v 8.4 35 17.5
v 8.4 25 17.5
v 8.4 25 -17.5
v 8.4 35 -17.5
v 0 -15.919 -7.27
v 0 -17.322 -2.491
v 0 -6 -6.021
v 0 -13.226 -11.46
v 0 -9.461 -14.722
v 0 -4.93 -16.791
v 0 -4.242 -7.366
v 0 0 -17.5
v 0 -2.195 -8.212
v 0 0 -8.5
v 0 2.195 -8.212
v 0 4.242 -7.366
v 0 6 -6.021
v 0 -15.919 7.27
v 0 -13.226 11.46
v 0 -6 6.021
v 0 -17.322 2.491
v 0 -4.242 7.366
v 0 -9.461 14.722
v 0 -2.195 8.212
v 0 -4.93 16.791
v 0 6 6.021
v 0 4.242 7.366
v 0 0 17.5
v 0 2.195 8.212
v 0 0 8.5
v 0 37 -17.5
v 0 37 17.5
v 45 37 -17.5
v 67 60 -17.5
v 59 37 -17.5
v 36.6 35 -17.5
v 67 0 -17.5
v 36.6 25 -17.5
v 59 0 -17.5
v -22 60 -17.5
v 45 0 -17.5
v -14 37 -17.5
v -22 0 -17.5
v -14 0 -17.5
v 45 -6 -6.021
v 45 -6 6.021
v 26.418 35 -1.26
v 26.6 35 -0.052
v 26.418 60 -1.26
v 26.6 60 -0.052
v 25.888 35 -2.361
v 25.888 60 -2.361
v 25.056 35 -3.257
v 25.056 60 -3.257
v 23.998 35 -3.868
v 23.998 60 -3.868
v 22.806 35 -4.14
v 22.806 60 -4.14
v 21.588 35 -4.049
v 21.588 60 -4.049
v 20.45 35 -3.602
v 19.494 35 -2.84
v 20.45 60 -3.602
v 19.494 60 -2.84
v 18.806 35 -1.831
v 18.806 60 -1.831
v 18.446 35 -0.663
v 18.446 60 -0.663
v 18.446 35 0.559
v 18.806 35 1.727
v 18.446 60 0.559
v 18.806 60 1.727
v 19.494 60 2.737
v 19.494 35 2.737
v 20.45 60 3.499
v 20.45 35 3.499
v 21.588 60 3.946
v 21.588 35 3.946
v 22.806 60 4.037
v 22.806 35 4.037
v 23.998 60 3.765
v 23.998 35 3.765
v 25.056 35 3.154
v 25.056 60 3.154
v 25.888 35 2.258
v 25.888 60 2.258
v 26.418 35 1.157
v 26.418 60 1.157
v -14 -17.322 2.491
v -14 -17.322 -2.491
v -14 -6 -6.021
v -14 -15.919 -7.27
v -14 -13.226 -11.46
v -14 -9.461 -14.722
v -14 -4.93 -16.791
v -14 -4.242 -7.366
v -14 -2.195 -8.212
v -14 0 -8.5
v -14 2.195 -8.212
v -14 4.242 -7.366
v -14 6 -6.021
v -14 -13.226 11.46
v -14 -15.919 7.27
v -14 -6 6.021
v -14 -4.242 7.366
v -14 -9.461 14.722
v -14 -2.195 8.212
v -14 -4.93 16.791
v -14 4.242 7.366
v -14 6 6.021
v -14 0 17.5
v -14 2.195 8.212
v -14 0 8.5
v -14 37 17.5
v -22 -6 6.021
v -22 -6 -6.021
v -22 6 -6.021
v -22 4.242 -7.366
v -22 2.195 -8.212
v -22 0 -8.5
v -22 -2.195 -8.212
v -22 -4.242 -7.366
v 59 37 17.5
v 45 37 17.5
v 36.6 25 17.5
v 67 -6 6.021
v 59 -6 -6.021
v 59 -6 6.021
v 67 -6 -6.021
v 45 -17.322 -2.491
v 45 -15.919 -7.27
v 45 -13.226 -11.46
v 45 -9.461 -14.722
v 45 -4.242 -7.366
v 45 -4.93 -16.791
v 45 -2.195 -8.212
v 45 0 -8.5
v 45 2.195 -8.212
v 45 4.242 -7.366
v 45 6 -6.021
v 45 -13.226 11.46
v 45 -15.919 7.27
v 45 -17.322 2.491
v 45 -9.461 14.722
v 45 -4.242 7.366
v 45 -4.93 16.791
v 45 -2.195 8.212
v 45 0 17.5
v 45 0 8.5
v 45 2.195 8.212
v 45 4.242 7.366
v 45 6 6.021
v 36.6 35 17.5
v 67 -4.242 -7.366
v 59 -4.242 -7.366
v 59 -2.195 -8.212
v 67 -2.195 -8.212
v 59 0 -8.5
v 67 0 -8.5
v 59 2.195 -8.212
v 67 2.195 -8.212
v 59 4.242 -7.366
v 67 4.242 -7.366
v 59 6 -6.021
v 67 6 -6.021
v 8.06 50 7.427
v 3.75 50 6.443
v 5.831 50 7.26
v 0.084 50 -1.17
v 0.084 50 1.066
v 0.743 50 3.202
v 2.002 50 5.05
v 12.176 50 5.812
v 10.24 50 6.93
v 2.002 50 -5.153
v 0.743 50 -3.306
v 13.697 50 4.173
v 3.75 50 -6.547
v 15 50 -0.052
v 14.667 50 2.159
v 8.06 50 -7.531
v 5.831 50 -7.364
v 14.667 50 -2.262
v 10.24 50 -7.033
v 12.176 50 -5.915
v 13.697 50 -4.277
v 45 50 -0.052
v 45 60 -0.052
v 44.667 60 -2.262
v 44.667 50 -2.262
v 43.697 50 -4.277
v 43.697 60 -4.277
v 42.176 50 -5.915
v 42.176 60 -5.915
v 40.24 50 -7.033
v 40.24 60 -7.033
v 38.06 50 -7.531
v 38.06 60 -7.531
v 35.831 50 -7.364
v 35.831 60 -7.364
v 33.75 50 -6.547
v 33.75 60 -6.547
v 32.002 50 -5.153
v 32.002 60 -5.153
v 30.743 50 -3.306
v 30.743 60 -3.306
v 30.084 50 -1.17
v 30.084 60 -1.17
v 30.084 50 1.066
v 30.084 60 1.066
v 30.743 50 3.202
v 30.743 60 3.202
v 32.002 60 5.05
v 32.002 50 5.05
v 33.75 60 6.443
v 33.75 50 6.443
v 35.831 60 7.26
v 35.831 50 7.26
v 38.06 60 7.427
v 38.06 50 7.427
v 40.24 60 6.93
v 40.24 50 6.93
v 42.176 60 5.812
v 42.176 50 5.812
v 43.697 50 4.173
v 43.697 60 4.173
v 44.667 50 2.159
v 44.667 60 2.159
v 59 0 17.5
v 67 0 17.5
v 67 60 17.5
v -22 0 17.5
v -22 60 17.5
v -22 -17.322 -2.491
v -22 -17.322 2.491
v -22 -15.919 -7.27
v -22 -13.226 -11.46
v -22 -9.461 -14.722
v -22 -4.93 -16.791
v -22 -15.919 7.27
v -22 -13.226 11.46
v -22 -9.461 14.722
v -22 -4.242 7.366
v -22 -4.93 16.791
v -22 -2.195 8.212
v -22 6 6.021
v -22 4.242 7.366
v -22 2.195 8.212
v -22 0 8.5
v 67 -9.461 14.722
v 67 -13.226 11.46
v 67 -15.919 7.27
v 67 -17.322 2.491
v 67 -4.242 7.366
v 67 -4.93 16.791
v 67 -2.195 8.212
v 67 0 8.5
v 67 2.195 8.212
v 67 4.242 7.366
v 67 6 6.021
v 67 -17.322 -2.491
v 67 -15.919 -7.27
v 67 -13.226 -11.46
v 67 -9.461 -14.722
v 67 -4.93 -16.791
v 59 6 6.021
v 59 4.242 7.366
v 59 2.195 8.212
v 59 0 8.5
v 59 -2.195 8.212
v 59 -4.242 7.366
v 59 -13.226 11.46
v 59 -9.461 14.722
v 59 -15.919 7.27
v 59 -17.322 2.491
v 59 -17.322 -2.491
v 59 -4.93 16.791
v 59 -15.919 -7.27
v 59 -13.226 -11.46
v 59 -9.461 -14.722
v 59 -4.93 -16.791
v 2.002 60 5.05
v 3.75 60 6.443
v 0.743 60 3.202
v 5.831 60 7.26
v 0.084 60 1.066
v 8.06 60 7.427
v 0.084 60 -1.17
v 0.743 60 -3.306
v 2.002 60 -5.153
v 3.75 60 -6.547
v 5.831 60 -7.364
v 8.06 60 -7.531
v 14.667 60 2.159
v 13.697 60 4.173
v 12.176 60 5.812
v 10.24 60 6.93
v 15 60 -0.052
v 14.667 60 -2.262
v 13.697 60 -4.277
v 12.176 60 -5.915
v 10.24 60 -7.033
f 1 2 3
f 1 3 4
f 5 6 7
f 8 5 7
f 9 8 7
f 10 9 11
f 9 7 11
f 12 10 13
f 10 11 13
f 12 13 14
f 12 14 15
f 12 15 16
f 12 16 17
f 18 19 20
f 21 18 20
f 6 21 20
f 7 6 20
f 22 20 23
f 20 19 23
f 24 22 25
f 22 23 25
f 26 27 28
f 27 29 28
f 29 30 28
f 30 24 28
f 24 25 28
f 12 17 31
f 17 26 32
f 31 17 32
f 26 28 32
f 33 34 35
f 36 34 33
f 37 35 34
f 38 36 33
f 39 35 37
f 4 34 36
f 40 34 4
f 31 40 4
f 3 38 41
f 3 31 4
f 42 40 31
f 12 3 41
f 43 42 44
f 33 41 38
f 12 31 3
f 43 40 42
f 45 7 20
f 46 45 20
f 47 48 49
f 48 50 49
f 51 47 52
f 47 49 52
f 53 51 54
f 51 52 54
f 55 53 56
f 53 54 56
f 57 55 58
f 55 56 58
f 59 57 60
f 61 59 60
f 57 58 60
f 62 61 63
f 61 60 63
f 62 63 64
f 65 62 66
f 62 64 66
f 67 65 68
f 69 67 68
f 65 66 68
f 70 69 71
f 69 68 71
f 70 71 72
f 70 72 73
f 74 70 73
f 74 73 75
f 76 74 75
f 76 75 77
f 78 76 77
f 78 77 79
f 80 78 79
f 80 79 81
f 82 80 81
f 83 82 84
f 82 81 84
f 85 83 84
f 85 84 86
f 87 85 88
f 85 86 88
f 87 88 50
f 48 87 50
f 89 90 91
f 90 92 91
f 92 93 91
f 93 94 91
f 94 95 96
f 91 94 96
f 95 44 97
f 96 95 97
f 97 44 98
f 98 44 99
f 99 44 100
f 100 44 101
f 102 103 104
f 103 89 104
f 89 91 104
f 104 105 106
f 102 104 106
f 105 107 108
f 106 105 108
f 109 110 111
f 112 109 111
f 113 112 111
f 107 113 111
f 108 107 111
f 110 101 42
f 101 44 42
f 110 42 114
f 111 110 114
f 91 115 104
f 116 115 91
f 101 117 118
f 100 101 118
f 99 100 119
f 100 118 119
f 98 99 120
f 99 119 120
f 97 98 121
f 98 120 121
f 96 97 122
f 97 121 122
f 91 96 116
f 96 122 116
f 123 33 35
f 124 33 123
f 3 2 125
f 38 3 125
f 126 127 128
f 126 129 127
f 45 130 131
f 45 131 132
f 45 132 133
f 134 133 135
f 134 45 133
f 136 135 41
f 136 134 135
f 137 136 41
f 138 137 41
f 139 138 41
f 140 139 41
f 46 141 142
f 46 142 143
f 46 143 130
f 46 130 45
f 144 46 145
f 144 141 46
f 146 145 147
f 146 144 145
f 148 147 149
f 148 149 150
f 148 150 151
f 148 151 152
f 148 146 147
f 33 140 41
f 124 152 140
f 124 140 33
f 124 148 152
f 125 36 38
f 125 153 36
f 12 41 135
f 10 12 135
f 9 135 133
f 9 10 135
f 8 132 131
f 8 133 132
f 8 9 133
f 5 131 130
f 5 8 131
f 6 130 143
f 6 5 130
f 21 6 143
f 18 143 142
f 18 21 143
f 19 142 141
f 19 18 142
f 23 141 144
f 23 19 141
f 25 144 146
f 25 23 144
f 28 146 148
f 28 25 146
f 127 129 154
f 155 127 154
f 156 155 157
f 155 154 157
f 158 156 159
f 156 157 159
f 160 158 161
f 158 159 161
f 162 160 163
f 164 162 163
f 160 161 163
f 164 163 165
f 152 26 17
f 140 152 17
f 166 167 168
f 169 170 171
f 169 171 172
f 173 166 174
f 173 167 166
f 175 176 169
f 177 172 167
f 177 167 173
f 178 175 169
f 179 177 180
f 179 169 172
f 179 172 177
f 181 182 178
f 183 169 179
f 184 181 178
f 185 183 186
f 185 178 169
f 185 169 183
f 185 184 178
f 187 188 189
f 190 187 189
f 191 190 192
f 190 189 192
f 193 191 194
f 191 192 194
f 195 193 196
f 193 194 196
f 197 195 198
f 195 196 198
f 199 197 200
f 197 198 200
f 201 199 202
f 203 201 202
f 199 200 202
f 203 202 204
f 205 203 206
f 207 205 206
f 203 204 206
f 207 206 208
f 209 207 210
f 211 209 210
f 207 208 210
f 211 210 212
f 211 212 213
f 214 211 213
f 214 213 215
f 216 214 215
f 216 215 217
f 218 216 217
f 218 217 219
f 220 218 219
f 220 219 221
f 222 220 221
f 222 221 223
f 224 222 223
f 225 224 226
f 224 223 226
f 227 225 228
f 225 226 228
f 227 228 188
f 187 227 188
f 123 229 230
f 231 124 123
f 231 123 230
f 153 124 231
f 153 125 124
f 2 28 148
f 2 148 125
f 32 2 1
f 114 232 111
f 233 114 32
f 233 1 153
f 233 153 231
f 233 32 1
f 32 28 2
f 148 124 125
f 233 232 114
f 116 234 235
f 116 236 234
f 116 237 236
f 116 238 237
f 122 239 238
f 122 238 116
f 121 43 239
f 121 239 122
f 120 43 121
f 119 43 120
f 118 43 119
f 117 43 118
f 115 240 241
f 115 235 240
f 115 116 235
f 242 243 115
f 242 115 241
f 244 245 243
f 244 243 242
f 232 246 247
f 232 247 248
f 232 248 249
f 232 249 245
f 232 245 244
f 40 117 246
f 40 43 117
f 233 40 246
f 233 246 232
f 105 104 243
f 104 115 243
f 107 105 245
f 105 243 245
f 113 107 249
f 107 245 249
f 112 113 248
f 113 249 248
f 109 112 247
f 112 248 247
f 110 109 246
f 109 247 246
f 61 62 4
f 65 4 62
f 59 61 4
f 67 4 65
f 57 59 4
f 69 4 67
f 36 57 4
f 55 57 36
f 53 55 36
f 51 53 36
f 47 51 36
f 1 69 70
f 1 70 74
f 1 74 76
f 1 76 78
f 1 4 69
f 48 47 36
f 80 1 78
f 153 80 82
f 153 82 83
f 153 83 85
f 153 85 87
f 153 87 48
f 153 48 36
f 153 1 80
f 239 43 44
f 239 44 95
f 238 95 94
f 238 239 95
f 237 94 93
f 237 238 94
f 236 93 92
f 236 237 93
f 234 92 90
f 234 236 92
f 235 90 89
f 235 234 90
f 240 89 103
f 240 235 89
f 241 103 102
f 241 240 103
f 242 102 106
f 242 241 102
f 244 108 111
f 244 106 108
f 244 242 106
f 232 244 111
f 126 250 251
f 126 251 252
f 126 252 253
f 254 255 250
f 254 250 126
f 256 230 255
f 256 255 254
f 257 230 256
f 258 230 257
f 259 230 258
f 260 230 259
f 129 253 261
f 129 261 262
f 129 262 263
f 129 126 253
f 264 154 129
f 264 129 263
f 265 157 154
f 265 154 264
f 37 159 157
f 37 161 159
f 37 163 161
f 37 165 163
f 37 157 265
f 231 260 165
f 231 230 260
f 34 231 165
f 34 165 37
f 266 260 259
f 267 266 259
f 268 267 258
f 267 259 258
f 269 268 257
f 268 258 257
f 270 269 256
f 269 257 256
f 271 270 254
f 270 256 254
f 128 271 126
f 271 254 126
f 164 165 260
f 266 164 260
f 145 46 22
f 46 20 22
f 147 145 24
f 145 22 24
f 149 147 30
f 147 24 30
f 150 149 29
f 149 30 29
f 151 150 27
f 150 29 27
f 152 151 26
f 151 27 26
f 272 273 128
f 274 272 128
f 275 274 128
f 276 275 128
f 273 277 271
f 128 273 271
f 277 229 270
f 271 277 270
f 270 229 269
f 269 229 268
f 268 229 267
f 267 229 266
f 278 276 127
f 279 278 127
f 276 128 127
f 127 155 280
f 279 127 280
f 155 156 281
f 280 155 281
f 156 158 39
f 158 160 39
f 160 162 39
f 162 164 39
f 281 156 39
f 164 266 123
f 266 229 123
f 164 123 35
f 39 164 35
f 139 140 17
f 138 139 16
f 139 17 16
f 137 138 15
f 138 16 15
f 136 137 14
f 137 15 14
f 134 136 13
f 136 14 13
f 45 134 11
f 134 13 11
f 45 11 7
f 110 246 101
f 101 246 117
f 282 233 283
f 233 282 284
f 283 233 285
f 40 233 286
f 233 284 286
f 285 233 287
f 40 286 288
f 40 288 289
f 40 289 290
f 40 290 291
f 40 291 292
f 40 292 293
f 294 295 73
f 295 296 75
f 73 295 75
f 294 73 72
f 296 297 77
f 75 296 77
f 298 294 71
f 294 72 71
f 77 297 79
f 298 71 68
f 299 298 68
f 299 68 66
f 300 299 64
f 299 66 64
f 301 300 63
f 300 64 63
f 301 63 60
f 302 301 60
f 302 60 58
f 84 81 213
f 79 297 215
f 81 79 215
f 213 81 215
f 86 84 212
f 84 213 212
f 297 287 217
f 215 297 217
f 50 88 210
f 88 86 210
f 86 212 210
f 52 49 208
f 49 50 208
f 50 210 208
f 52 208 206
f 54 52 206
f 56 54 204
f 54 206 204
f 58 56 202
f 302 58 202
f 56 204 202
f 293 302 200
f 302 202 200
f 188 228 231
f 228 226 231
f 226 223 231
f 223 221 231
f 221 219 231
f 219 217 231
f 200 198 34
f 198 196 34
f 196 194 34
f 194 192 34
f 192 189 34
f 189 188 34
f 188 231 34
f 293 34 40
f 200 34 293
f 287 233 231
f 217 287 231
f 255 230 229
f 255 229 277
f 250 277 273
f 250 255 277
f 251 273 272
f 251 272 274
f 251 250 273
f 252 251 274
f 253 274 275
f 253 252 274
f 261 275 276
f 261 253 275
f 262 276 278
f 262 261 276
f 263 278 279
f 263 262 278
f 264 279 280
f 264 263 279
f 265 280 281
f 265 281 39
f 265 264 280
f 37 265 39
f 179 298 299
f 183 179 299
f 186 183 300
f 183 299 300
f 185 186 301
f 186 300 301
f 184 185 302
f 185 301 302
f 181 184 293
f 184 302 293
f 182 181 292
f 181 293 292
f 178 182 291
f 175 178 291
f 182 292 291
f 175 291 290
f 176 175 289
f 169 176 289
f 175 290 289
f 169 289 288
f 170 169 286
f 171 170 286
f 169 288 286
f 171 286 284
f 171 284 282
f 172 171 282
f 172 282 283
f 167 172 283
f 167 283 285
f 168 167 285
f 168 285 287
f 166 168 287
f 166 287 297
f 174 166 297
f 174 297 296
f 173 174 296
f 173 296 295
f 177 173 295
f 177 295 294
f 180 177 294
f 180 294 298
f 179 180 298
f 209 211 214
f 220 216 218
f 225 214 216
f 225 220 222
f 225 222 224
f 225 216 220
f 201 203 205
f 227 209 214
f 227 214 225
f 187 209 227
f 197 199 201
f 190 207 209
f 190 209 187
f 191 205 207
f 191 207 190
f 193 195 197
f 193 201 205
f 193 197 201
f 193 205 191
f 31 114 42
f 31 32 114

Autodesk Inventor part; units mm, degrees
ref_plane "YZ Plane" through (0, 0, 0) normal (1, 0, 0) x (0, 1, 0)
ref_plane "XZ Plane" through (0, 0, 0) normal (0, 1, 0) x (-1, 0, 0)
sketch "Эскиз1" plane through (0, 0, 0) normal (1, 0, 0) x (0, 1, 0)
  line L0 (-6, -6.0208) -> (-6, 6.0208)
  arc A0 (-6, -6.0208) -> (6, -6.0208) centre (0, 0) ccw
  line L1 (6, 6.0208) -> (6, -6.0208)
  arc A1 (6, 6.0208) -> (-6, 6.0208) centre (0, 0) ccw
  circle A2 centre (0, 0) radius 17.5
  line L2 (0, 17.5) -> (60, 17.5)
  line L3 (60, 17.5) -> (60, -17.5)
  line L4 (60, -17.5) -> (0, -17.5)
  line L5 (0, -17.5) -> (0, -8.5)
  line L6 (0, 8.5) -> (0, 17.5)
  dimension "d0" = 35
  dimension "d1" = 60
extrude "Выдавливание1" add sketch "Эскиз1" along normal blind 45 contours A0 L5 A2 L6 A1 L0 | A0 L1 A1 L6 A2 L5 | A2 L2 L3 L4
sketch "Эскиз2" plane through (45, 0, 0) normal (1, 0, 0) x (0, 0, -1)
  line L0 (17.5, 60) -> (-17.5, 60) projected
  line L1 (17.5, 0) -> (17.5, 60) projected
  line L2 (-17.5, 60) -> (17.5, 60)
  line L3 (17.5, 60) -> (17.5, 37)
  line L4 (17.5, 37) -> (-17.5, 37)
  line L5 (-17.5, 37) -> (-17.5, 60)
  point P0 (0, 0)
  dimension "d4" = 23
extrude "Выдавливание2" add sketch "Эскиз2" along normal blind 22
ref_plane "РабПлоскость1" through (22.5, 0, 17.5) normal (1, 0, 0) x (0, 0, -1)
mirror "Зеркальное отражение1" about plane through (22.5, 0, 17.5) normal (1, 0, 0) of "Выдавливание2"
sketch "Эскиз3" plane through (45, 0, 0) normal (1, 0, 0) x (0, 0, -1)
  arc A0 (6.0208, -6) -> (6.0208, 6) centre (0, 0) ccw projected
  line L0 (6.0208, -6) -> (-6.0208, -6) projected
  arc A1 (-6.0208, 6) -> (-6.0208, -6) centre (0, 0) ccw projected
  line L1 (6.0208, 6) -> (-6.0208, 6) projected
  line L2 (17.5, 37) -> (-17.5, 37) projected
  line L3 (-17.5, 37) -> (-17.5, 0) projected
  arc A2 (-17.5, 0) -> (17.5, 0) centre (0, 0) ccw projected
  line L4 (17.5, 0) -> (17.5, 37) projected
sketch "Эскиз4" plane through (67, 0, 0) normal (1, 0, 0) x (0, 0, -1)
  arc A0 (6.0208, -6) -> (6.0208, 6) centre (0, 0) ccw
  line L0 (6.0208, -6) -> (-6.0208, -6)
  arc A1 (-6.0208, 6) -> (-6.0208, -6) centre (0, 0) ccw
  line L1 (6.0208, 6) -> (-6.0208, 6)
  line L2 (17.5, 37) -> (-17.5, 37)
  line L3 (-17.5, 37) -> (-17.5, 0)
  arc A2 (-17.5, 0) -> (17.5, 0) centre (0, 0) ccw
  line L4 (17.5, 0) -> (17.5, 37)
extrude "Выдавливание3" add sketch "Эскиз4" against normal blind 8
mirror "Зеркальное отражение2" about plane through (22.5, 0, 17.5) normal (1, 0, 0) of "Выдавливание3"
sketch "Эскиз5" plane through (67, 60, 17.5) normal (0, 1, 0) x (1, 0, 0)
  line L0 (-89, 35) -> (-89, 0) projected
  line L1 (-89, 35.1034) -> (-89, 0)
  line L2 (-89, 0) -> (-89, 35.1034)
  line L3 (-89, 35) -> (0, 35) projected
  line L4 (-89, 35) -> (0, 35)
  line L5 (-89, 17.5517) -> (-44.5, 17.5517)
  circle A0 centre (-44.5, 17.5517) radius 4.1
  line L6 (-44.5, 17.5517) -> (-59.5, 17.5517)
  circle A1 centre (-59.5, 17.5517) radius 7.5
  line L7 (-44.5, 17.5517) -> (-29.5, 17.5517)
  circle A2 centre (-29.5, 17.5517) radius 7.5
  point P0 (-67, 17.5)
  dimension "d9" = 8.2
  dimension "d10" = 15
  dimension "d11" = 15
  dimension "d12" = 15
  dimension "d13" = 15
extrude "Выдавливание4" cut sketch "Эскиз5" against normal blind 10 contours L5 A1 | L5 A1 | A2
sketch "Эскиз6" plane through (67, 60, 17.5) normal (0, 1, 0) x (1, 0, 0)
  line L0 (-89, 35) -> (-89, 0)
  line L1 (-89, 35.1034) -> (-89, 0)
  line L2 (-89, 0) -> (-89, 35.1034)
  line L3 (-89, 35) -> (0, 35)
  line L4 (-89, 35) -> (0, 35)
  line L5 (-89, 17.5517) -> (-44.5, 17.5517)
  circle A0 centre (-44.5, 17.5517) radius 4.1
  line L6 (-44.5, 17.5517) -> (-59.5, 17.5517)
  circle A1 centre (-59.5, 17.5517) radius 7.5
  line L7 (-44.5, 17.5517) -> (-29.5, 17.5517)
  circle A2 centre (-29.5, 17.5517) radius 7.5
  point P0 (-67, 17.5)
  point P1 (-67, 17.5)
  dimension "d16" = 8.2
  dimension "d17" = 15
  dimension "d18" = 15
  dimension "d19" = 15
  dimension "d20" = 15
extrude "Выдавливание5" cut sketch "Эскиз6" against normal blind 35 contours A0 L7 L5 | L5 L7 A0
sketch "Эскиз7" plane through (0, 0, 17.5) normal (0, 0, 1) x (1, 0, 0)
  line L0 (18.4, 60) -> (18.4, 25) projected
  line L1 (26.6, 60) -> (26.6, 25) projected
  line L2 (0, 37) -> (0, 0) projected
  line L3 (45, 0) -> (0, 0) projected
  line L4 (45, 37) -> (45, 0) projected
  line L5 (45, 37) -> (59, 37) projected
  line L6 (59, 0) -> (59, 37) projected
  line L7 (67, 0) -> (59, 0) projected
  line L8 (67, 60) -> (67, 0) projected
  line L9 (-22, 60) -> (67, 60) projected
  line L10 (-22, 60) -> (-22, 0) projected
  line L11 (-22, 0) -> (-14, 0) projected
  line L12 (-14, 0) -> (-14, 37) projected
  line L13 (0, 37) -> (-14, 37) projected
  line L14 (18.4, 25) -> (26.6, 25) projected
  line L15 (18.4, 25) -> (8.4, 25)
  line L16 (8.4, 25) -> (8.4, 35)
  line L17 (8.4, 35) -> (36.6, 35)
  line L18 (36.6, 35) -> (36.6, 25)
  line L19 (26.6, 25) -> (36.6, 25)
  line L20 (18.4, 25) -> (26.6, 25)
  dimension "d23" = 10
  dimension "d24" = 10
  dimension "d25" = 28.2
  dimension "d26" = 10
extrude "Выдавливание6" cut sketch "Эскиз7" against normal blind 84.5 contours L17 L1 L14 L0 | L0 L15 L16 L17 | L17 L18 L19 L1
properties part number "joint1_level" material "Пластик АБС"
